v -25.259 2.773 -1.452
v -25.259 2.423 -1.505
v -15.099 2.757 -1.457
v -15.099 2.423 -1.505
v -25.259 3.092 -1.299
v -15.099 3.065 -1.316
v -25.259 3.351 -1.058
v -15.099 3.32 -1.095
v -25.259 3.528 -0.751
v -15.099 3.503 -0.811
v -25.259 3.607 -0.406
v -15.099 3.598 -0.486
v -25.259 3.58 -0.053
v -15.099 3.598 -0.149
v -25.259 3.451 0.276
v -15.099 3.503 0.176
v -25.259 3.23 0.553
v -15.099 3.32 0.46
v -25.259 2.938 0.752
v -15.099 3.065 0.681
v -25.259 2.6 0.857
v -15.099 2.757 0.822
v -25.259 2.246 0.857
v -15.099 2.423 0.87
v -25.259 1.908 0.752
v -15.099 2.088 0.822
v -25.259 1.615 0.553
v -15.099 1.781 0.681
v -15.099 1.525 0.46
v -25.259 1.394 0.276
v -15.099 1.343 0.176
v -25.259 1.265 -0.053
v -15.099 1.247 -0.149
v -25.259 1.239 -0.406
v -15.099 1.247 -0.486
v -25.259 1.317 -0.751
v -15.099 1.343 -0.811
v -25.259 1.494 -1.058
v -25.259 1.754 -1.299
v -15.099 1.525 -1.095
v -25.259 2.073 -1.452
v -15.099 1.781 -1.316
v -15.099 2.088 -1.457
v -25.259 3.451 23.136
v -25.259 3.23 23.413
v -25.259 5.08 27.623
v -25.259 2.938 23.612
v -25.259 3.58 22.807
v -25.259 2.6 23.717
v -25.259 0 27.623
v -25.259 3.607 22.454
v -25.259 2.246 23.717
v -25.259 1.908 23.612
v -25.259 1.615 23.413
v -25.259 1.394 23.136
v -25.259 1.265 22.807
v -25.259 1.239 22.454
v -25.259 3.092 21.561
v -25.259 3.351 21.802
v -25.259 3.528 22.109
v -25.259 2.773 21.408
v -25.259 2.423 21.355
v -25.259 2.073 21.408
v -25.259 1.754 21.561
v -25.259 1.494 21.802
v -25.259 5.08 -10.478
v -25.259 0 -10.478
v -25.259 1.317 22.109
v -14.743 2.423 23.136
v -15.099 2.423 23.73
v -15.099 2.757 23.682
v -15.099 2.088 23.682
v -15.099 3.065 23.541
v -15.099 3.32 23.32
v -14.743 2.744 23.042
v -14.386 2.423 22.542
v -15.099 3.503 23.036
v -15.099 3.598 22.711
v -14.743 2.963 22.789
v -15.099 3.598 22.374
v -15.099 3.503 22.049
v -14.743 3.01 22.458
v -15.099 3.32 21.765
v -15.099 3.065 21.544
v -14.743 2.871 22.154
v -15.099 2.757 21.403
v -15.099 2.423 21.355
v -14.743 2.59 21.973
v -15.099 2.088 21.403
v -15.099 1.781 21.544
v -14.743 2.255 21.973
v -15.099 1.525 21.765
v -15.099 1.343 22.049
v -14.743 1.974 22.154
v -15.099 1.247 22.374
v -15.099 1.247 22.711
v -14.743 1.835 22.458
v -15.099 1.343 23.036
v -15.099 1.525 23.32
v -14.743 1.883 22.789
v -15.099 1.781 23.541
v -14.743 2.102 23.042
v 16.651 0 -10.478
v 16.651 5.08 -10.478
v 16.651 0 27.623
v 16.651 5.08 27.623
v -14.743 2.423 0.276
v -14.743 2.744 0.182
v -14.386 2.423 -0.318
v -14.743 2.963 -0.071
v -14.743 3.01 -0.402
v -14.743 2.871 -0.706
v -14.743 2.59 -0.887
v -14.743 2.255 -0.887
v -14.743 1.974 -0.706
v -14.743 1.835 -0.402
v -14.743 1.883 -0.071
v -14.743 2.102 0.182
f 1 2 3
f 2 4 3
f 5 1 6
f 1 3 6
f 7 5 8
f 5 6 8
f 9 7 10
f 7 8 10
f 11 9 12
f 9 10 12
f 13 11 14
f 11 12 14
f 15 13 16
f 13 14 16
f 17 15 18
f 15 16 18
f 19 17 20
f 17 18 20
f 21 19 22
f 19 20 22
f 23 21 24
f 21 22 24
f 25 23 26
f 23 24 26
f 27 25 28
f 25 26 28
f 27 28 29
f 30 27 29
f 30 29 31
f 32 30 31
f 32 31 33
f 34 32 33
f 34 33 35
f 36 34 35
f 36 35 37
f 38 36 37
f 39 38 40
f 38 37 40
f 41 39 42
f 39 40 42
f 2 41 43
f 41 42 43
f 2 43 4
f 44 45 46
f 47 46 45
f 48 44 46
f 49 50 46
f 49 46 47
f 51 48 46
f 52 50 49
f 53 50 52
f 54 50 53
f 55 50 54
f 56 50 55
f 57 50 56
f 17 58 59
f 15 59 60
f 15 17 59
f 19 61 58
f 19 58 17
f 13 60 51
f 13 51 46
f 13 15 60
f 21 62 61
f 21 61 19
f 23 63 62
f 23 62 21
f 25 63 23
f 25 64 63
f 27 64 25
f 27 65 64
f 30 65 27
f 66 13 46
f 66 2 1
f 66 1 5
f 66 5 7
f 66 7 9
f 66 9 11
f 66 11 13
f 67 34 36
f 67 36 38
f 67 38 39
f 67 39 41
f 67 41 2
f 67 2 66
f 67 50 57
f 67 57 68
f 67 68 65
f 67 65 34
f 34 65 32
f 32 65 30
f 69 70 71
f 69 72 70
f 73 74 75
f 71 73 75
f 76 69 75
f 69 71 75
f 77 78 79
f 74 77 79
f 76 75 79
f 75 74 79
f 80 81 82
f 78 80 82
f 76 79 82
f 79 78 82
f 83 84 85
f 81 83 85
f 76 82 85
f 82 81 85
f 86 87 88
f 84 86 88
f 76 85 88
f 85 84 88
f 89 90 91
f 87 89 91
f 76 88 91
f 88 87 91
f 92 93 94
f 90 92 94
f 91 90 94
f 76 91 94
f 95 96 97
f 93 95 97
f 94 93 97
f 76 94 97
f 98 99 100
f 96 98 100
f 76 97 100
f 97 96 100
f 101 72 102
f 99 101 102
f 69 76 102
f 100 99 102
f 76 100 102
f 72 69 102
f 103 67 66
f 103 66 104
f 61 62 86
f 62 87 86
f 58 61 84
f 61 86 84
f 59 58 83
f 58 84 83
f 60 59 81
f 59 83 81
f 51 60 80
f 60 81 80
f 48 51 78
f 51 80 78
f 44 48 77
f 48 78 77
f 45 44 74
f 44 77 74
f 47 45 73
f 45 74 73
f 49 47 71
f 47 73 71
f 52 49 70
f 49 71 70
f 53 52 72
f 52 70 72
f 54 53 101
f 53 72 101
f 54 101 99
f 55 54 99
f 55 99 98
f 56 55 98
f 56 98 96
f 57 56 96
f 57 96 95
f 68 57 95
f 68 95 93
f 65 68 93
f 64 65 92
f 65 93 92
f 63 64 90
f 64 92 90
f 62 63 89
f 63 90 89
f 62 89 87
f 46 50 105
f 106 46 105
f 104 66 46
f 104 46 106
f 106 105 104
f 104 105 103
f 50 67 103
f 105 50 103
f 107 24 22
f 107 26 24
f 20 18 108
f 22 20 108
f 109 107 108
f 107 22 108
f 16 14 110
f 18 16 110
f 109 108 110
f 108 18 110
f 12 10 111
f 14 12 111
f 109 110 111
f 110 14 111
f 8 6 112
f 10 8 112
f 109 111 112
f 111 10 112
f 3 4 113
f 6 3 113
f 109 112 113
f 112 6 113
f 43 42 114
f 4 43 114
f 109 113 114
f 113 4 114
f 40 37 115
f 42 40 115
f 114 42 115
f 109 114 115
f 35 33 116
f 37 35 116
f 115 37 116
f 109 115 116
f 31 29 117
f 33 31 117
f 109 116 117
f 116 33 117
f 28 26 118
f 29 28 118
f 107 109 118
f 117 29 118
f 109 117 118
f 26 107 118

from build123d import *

# Parameters (mm, degrees)
SKETCH1_W                     = 41.91
SKETCH1_H                     = 38.1
BOSS_EXTRUDE1_DEPTH           = 5.08
TAP_DRILL_FOR_4_48_TAP1_D     = 2.3749
TAP_DRILL_FOR_4_48_TAP1_DEPTH = 10.16
TAP_DRILL_FOR_4_48_TAP1_TIP   = 0.713491942


with BuildPart() as part:
    # Sketch1 → Boss-Extrude1 (new body)
    with BuildSketch(Plane(origin=(0, 0, 0), x_dir=(1, 0, 0), z_dir=(0, 1, 0))):
        with Locations((-4.30427027, -8.5725)):
            Rectangle(SKETCH1_W, SKETCH1_H)
    extrude(amount=BOSS_EXTRUDE1_DEPTH)

    # Tap Drill for #4-48 Tap1
    with Locations(Plane.ZY.offset(25.25927027)):
        with Locations((-0.3175, 2.422722957), (22.5425, 2.422722957)):
            Hole(TAP_DRILL_FOR_4_48_TAP1_D / 2, depth=TAP_DRILL_FOR_4_48_TAP1_DEPTH)
            with Locations((0, 0, -(TAP_DRILL_FOR_4_48_TAP1_DEPTH + TAP_DRILL_FOR_4_48_TAP1_TIP / 2))):  # 118° drill point
                Cone(0, TAP_DRILL_FOR_4_48_TAP1_D / 2, TAP_DRILL_FOR_4_48_TAP1_TIP, mode=Mode.SUBTRACT)


solid = part.part
